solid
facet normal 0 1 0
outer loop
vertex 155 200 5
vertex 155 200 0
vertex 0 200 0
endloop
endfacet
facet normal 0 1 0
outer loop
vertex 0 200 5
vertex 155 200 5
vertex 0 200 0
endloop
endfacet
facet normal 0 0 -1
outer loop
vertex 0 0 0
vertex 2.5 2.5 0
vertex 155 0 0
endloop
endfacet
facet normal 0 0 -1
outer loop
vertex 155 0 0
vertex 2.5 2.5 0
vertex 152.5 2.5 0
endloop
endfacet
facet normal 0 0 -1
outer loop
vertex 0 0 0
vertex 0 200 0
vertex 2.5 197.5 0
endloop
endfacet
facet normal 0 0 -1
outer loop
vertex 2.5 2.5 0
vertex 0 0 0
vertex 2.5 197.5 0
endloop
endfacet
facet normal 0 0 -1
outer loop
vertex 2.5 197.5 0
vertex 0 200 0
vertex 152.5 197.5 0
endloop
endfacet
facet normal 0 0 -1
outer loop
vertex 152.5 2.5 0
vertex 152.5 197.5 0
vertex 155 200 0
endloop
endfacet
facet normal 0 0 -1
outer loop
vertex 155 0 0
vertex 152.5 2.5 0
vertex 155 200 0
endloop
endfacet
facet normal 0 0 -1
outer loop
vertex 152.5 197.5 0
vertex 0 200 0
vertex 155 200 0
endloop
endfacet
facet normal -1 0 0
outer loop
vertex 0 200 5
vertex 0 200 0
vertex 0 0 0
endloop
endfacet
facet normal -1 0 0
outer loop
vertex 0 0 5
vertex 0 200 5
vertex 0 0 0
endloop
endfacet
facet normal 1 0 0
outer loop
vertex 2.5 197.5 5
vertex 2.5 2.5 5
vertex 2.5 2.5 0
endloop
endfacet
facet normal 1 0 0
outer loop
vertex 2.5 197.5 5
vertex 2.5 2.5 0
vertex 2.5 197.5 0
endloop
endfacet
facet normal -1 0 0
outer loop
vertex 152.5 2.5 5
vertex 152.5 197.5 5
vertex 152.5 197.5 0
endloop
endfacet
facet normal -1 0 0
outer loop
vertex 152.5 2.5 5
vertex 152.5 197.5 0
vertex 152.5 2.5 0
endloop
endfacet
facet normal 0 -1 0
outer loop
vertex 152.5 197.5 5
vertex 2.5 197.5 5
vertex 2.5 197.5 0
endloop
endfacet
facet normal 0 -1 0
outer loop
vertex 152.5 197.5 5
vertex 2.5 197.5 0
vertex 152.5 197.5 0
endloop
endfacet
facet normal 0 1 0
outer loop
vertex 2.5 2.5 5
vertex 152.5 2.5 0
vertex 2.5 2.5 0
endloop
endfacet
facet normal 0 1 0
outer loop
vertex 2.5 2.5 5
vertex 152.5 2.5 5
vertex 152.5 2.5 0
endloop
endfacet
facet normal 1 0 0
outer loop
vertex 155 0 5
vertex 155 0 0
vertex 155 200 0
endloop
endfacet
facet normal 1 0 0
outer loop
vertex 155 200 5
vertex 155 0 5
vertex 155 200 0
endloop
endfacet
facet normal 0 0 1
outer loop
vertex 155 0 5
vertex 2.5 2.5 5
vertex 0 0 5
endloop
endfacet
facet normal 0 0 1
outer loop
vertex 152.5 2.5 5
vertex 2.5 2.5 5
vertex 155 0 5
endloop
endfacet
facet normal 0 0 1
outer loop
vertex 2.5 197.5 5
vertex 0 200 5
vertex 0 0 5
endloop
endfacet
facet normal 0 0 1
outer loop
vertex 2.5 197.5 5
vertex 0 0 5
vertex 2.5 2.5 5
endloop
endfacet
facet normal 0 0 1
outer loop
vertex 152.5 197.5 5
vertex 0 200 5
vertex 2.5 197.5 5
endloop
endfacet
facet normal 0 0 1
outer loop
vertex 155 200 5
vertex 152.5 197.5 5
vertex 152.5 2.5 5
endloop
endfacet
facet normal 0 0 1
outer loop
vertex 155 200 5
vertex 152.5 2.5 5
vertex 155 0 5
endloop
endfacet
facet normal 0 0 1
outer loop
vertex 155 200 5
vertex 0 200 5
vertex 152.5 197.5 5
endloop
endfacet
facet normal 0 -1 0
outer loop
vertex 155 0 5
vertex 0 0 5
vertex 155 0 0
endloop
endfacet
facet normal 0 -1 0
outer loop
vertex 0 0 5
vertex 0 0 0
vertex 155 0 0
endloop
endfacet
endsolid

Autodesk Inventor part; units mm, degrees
ref_plane "YZ Plane" through (0, 0, 0) normal (1, 0, 0) x (0, 1, 0)
ref_plane "XZ Plane" through (0, 0, 0) normal (0, 1, 0) x (-1, 0, 0)
ref_plane "XY Plane" through (0, 0, 0) normal (0, 0, 1) x (1, 0, 0)
sketch "Sketch1" plane through (0, 0, 0) normal (0, 0, 1) x (1, 0, 0)
  line L0 (0, 0) -> (155, 0)
  line L1 (155, 0) -> (155, 200)
  line L2 (155, 200) -> (0, 200)
  line L3 (0, 200) -> (0, 0)
  dimension "d0" = 200
  dimension "d1" = 155
extrude "Extrusion1" add sketch "Sketch1" along normal blind 5
sketch "Sketch2" plane through (0, 0, 5) normal (0, 0, 1) x (1, 0, 0)
  line L0 (155, 0) -> (155, 200) projected
  line L1 (155, 200) -> (0, 200) projected
  line L2 (0, 200) -> (0, 0) projected
  line L3 (0, 0) -> (155, 0) projected
  line L4 (2.5, 197.5) -> (152.5, 197.5)
  line L5 (152.5, 197.5) -> (152.5, 2.5)
  line L6 (152.5, 2.5) -> (2.5, 2.5)
  line L7 (2.5, 2.5) -> (2.5, 197.5)
  dimension "d4" = 150
  dimension "d5" = 195
  dimension "d6" = 2.5
  dimension "d7" = 2.5
extrude "Extrusion2" cut sketch "Sketch2" against normal up to surface (5 mm away) contours L4 L5 L6 L7
properties part number "rubberSeal"
